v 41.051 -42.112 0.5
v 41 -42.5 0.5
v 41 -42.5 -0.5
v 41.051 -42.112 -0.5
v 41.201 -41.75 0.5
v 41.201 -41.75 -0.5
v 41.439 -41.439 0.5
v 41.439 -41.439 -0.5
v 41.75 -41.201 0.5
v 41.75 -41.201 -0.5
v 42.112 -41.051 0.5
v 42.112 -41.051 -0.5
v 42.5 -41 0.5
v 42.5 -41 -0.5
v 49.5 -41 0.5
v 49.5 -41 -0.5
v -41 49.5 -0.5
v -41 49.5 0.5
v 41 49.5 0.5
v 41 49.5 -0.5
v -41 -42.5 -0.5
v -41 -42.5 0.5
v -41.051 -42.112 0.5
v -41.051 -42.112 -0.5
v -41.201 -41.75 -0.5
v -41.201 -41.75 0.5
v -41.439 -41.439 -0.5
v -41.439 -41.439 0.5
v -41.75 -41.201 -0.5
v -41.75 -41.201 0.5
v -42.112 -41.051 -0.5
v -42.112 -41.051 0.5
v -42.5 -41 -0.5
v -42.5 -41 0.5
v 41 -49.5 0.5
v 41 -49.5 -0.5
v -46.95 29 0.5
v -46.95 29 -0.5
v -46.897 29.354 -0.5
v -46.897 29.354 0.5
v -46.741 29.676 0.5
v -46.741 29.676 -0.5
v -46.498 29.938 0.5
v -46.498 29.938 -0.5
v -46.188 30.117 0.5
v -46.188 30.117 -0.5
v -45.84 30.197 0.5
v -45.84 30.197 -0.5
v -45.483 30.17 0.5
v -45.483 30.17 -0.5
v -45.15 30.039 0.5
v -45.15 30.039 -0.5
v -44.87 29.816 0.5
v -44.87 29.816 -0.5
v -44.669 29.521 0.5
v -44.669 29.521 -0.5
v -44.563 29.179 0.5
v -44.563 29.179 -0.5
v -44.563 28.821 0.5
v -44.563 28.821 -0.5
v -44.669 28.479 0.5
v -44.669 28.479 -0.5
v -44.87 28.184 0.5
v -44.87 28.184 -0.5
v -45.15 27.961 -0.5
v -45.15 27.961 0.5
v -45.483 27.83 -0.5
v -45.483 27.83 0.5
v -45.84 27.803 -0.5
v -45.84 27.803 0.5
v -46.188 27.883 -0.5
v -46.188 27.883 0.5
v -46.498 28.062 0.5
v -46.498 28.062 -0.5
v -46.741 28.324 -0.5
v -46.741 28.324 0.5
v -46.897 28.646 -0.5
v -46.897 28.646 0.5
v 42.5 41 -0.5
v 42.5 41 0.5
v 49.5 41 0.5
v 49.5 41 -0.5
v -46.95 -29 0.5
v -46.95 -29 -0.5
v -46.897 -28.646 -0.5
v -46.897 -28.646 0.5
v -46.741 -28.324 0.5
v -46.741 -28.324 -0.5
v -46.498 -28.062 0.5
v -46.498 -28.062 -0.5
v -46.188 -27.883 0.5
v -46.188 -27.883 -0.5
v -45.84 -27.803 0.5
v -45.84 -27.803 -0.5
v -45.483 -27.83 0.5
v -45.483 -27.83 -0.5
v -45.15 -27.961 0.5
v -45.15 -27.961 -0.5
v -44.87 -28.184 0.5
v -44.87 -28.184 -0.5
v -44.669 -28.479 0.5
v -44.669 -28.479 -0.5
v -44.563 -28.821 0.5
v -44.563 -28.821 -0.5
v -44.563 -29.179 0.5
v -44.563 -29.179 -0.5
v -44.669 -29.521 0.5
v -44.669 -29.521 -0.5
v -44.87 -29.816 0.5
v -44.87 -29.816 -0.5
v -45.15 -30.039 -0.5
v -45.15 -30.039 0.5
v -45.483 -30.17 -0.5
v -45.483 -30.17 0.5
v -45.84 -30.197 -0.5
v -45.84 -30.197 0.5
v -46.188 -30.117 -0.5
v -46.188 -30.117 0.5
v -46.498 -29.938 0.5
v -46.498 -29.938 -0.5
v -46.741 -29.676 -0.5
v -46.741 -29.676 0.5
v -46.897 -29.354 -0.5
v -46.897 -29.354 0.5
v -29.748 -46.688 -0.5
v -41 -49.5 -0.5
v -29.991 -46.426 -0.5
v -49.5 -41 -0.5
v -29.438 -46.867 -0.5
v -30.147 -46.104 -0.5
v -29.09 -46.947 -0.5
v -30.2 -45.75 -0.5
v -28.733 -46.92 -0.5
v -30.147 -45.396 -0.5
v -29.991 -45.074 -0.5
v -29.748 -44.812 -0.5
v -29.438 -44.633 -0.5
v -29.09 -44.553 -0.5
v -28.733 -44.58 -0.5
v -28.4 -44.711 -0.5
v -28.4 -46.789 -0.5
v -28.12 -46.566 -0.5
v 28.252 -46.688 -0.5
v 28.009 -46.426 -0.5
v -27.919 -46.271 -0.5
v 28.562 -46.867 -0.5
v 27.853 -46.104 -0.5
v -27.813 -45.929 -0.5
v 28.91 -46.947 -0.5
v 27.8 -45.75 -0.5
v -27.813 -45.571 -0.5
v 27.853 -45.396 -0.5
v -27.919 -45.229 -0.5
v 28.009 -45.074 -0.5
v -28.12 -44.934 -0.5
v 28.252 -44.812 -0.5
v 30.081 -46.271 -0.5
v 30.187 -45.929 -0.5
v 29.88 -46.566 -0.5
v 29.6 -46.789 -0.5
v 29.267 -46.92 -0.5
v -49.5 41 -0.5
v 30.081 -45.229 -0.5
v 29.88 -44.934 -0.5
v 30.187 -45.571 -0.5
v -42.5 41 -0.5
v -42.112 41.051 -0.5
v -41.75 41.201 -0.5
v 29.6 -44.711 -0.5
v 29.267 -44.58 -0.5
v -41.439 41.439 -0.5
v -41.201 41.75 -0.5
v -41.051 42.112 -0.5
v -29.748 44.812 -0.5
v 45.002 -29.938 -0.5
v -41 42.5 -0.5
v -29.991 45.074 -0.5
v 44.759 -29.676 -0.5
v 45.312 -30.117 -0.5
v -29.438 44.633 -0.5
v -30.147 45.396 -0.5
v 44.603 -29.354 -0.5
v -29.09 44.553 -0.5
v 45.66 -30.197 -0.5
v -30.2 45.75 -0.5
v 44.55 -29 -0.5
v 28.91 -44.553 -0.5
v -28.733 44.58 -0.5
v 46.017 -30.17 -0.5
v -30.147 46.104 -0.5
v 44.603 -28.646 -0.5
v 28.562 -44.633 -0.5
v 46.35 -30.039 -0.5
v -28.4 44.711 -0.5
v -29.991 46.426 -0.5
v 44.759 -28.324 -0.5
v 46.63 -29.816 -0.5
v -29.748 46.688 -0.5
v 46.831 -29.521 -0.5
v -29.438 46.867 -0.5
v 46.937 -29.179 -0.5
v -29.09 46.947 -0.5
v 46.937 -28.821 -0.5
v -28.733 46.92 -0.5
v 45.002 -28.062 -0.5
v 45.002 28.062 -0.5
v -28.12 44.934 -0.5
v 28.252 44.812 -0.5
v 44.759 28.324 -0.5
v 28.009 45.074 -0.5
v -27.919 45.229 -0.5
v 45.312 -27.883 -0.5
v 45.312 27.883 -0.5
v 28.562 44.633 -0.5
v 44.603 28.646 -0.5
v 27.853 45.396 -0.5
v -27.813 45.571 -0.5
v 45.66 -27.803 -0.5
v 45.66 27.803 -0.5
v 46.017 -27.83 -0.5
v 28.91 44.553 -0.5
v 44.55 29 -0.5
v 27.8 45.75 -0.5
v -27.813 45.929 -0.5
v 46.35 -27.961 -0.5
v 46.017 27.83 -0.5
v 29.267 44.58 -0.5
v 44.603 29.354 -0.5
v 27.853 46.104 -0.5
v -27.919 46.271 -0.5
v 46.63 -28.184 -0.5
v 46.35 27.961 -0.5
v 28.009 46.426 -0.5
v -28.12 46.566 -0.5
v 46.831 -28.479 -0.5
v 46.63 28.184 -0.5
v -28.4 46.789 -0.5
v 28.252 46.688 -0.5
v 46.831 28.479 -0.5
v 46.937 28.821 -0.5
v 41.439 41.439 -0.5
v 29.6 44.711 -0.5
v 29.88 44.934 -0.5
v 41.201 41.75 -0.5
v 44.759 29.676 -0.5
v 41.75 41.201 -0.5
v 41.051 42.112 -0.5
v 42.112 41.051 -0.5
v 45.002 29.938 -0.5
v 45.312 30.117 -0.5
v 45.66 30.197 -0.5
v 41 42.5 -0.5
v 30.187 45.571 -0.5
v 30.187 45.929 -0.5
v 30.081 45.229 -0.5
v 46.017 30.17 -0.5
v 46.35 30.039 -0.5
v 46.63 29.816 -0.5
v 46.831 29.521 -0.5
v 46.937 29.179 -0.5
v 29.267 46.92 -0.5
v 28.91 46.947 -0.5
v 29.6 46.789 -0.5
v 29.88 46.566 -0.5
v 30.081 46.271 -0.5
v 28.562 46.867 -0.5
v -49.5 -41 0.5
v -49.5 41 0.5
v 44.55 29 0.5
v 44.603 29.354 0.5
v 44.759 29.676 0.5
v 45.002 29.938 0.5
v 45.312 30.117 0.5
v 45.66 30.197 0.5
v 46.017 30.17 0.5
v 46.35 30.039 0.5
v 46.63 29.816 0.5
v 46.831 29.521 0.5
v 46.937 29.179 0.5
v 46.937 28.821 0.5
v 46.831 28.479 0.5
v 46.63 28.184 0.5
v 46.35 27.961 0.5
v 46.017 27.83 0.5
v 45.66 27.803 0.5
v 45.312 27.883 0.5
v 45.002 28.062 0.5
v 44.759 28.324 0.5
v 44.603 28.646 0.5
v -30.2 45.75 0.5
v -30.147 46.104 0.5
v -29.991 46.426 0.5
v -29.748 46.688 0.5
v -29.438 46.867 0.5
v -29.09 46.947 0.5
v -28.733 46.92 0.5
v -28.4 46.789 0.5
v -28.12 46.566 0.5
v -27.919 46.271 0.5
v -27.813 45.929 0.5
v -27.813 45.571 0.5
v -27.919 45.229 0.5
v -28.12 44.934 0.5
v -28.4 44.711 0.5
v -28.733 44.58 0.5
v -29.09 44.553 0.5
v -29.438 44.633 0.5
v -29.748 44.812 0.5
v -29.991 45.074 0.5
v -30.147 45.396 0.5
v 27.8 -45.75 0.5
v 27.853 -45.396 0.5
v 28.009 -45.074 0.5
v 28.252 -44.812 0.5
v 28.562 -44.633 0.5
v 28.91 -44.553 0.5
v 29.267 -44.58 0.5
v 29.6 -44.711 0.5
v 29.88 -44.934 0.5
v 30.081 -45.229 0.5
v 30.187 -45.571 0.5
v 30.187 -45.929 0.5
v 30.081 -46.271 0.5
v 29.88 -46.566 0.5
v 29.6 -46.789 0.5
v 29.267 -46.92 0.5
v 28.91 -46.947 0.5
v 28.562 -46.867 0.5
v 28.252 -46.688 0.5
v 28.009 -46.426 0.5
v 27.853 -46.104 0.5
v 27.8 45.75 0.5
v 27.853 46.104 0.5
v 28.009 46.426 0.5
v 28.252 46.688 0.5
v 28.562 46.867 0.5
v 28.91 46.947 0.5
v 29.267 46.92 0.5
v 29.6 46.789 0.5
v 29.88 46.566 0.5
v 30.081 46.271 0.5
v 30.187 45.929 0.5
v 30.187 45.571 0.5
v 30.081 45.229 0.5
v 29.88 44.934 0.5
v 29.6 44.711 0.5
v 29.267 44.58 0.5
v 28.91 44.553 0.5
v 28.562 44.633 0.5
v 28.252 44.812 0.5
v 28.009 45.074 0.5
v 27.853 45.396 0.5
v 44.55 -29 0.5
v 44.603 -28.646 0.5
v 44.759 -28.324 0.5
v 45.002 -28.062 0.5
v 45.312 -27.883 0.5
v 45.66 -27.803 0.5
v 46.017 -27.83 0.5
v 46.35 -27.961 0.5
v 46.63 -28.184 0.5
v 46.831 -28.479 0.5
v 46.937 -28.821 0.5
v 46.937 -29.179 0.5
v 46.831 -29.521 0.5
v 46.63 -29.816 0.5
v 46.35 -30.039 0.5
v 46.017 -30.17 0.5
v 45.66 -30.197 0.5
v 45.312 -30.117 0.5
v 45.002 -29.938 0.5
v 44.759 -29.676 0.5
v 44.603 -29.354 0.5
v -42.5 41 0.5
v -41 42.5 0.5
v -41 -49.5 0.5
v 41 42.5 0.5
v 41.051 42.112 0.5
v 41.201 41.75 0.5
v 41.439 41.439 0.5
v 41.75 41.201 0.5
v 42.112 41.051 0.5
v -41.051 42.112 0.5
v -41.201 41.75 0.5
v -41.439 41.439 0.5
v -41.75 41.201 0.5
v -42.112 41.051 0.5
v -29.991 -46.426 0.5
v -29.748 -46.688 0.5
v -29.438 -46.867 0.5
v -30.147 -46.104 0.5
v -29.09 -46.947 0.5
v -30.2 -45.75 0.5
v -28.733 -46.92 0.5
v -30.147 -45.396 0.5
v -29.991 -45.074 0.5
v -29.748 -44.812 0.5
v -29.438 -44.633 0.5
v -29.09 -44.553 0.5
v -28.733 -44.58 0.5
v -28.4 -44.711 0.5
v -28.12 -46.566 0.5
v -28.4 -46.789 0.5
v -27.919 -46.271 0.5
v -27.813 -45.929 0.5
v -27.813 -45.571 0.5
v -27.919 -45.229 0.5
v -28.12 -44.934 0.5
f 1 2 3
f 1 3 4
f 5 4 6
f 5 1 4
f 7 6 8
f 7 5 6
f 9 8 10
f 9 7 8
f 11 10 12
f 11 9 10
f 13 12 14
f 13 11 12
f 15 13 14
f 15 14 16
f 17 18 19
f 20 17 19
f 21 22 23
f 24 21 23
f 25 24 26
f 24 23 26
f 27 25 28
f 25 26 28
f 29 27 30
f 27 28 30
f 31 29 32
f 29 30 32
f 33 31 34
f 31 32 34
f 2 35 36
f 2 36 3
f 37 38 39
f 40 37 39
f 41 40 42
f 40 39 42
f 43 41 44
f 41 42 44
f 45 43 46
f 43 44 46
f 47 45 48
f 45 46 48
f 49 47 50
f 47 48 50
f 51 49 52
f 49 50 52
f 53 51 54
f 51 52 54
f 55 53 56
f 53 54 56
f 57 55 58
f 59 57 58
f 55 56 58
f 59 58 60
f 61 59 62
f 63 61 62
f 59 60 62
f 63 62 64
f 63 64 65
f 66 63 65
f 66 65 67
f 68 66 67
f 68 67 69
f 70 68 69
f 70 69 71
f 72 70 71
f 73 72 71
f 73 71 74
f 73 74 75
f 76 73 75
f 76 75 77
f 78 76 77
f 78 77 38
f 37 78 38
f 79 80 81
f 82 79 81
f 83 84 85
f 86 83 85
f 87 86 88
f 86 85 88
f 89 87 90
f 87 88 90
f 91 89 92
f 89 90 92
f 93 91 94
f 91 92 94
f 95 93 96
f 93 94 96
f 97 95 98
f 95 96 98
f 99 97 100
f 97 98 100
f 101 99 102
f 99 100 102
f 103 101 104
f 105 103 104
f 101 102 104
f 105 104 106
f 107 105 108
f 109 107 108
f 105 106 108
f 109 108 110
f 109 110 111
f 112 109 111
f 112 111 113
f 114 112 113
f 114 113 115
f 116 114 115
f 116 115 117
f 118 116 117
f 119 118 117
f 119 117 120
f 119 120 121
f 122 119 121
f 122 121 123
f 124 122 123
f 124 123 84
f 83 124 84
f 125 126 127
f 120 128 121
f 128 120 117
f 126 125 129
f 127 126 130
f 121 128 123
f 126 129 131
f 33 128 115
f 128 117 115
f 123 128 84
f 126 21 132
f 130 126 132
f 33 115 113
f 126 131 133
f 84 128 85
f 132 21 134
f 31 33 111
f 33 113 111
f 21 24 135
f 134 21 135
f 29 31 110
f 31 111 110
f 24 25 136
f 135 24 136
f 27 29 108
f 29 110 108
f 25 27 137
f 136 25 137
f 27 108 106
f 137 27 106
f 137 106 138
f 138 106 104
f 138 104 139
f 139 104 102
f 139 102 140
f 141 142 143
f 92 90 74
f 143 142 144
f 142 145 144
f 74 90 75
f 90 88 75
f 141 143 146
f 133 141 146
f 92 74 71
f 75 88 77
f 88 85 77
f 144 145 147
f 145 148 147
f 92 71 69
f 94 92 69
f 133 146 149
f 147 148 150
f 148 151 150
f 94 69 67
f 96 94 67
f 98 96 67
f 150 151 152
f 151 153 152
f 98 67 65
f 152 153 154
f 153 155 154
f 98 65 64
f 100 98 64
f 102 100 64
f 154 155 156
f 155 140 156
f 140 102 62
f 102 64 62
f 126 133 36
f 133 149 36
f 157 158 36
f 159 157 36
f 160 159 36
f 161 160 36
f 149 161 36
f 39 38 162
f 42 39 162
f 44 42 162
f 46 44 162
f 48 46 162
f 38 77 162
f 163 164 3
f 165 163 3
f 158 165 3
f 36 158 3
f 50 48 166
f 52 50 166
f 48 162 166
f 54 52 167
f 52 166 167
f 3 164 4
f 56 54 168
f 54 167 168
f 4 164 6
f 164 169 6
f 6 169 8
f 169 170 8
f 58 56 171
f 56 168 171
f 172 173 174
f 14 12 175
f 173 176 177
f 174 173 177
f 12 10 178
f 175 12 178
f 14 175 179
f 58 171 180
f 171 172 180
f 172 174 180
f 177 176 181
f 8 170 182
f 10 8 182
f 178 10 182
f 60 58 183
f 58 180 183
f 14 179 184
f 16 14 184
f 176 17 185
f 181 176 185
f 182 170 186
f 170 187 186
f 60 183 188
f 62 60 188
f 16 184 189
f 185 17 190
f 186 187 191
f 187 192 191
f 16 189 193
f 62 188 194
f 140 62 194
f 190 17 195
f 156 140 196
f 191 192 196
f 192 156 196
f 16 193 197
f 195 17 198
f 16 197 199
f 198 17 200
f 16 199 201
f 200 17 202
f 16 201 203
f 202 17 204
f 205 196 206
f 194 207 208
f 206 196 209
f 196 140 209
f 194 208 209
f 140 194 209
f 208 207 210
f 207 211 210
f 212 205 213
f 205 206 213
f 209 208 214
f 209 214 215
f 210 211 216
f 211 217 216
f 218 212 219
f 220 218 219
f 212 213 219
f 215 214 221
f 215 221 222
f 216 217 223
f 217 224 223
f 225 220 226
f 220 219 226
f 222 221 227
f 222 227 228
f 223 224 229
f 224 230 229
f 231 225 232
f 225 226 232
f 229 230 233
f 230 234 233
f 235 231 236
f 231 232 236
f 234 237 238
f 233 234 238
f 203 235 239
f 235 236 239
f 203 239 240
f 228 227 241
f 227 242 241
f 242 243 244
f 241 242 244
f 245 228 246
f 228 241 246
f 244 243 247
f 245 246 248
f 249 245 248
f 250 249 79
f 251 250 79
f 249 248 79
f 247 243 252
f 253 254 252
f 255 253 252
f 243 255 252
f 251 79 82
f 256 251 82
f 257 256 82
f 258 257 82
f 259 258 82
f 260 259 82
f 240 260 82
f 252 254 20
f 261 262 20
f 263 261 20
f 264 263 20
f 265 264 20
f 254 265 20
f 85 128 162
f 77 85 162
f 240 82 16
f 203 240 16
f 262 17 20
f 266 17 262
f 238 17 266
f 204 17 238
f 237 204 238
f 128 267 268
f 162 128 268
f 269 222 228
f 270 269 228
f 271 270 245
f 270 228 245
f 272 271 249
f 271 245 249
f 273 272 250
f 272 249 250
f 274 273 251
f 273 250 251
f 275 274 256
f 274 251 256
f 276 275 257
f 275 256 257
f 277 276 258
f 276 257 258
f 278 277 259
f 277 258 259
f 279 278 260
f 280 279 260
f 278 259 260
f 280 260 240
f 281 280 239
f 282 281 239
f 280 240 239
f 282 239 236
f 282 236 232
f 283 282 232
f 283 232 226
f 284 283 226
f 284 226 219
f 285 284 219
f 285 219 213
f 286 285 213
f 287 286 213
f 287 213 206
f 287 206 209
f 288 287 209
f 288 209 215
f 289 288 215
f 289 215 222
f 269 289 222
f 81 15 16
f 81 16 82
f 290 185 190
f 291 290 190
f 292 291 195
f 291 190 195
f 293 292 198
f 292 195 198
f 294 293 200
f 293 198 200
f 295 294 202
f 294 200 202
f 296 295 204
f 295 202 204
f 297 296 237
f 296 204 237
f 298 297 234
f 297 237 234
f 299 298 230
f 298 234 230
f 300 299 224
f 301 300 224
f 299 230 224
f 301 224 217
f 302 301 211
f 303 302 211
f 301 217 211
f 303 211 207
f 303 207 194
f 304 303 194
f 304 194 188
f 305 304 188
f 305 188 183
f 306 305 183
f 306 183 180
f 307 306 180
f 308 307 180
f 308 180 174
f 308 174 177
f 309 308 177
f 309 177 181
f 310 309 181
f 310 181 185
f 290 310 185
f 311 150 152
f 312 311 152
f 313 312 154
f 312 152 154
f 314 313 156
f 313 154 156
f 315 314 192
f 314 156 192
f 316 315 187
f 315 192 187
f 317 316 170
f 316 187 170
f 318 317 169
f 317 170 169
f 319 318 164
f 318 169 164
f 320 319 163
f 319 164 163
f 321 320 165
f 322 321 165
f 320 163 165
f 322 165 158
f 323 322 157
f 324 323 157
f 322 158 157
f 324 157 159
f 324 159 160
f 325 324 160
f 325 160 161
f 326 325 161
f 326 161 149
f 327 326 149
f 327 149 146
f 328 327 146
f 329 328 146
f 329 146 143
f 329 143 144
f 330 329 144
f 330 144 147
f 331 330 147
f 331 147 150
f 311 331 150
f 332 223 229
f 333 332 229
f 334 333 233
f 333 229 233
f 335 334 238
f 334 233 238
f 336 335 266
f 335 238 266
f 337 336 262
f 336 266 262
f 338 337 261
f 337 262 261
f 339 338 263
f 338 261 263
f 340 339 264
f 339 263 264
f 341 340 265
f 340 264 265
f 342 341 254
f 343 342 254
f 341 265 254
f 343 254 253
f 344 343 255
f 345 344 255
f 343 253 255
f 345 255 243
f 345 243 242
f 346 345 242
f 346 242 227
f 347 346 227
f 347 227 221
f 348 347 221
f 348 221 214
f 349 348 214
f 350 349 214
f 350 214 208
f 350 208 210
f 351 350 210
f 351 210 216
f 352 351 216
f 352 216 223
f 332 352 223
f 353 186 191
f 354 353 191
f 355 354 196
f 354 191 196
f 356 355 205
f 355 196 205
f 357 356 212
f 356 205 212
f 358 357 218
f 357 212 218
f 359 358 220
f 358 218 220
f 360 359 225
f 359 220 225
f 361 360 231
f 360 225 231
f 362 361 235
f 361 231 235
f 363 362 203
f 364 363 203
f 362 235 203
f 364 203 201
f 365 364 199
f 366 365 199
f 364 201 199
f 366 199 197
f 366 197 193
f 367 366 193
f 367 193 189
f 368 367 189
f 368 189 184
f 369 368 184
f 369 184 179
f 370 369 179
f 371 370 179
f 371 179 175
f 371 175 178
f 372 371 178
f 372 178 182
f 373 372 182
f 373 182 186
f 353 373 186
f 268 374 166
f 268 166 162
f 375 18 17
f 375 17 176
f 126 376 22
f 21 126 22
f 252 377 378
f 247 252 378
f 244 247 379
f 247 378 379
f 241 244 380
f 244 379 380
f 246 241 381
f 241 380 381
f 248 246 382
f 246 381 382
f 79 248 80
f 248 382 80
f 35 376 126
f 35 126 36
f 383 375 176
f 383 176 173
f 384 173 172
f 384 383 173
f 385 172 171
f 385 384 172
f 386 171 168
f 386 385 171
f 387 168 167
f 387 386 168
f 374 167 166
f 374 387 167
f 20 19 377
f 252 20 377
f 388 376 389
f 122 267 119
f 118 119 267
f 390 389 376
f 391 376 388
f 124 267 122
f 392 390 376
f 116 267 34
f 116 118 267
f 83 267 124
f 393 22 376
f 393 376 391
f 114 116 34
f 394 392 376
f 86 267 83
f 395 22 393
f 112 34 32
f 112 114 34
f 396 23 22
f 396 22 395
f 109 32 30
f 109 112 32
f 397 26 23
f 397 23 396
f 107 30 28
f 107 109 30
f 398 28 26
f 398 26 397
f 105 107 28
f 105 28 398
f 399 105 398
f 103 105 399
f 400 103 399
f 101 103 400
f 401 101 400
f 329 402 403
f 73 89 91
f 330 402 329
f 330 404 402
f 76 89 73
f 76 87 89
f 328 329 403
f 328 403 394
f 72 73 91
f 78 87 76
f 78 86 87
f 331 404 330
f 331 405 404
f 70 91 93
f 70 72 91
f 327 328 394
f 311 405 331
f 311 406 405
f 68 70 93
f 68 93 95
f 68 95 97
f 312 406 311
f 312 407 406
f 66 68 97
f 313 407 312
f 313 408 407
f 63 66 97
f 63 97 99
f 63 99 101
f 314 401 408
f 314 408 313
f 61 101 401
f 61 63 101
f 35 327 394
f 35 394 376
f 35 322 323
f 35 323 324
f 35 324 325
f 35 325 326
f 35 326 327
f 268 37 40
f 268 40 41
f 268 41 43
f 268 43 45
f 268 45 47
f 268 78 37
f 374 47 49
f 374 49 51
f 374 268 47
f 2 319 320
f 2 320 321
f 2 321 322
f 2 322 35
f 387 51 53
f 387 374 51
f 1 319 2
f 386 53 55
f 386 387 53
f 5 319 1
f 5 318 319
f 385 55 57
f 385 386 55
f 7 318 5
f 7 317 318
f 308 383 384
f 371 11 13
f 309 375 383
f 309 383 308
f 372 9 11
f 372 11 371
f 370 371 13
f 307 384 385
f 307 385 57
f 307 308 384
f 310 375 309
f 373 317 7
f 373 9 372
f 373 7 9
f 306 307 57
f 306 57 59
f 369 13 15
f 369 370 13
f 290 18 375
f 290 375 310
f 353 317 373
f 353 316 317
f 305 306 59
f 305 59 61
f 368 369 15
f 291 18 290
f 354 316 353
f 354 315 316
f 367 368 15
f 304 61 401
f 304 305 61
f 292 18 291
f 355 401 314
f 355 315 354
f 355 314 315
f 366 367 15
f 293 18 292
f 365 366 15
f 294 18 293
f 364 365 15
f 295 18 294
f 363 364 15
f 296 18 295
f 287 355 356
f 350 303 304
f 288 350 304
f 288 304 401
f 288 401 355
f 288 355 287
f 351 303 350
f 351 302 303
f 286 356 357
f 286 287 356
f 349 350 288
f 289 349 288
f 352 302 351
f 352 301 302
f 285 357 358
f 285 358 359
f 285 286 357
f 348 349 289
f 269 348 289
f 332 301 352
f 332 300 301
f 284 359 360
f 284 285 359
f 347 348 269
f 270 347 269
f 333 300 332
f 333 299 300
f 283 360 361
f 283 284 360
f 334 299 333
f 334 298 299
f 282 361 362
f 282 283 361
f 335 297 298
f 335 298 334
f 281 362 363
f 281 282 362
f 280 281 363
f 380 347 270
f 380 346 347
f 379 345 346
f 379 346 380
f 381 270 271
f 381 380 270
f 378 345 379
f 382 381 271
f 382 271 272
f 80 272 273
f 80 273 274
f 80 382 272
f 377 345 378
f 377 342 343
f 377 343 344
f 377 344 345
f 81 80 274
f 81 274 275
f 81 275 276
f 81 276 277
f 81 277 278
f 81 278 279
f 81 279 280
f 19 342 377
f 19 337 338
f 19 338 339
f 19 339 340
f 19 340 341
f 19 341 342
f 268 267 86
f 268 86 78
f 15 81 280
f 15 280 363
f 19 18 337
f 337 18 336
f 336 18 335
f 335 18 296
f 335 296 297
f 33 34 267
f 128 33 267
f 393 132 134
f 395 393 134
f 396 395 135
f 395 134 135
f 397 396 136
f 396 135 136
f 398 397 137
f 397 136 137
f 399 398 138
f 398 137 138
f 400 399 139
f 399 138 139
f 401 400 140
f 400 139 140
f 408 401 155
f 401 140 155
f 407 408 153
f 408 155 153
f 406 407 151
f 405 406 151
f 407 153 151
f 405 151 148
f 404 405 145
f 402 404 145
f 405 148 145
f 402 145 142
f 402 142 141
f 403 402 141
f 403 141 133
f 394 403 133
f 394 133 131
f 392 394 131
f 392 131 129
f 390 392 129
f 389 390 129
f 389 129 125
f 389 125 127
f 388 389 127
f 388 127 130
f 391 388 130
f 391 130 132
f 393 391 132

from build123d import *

# Parameters (mm, degrees)
SKETCH1_W           = 99
SKETCH1_H           = 99
BOSS_EXTRUDE1_DEPTH = 0.5
CUT_EXTRUDE1_DEPTH  = 71.010713466
M2_HOLE1_B_D        = 2.4
M2_HOLE1_B_DEPTH    = 3
M2_HOLE1_B_TIP      = 0.721032743


with BuildPart() as part:
    # Sketch1 → Boss-Extrude1 (new, symmetric)
    with BuildSketch(Plane.XY):
        Rectangle(SKETCH1_W, SKETCH1_H)
    extrude(amount=BOSS_EXTRUDE1_DEPTH, both=True)

    # Sketch2 → Cut-Extrude1 (cut, through all)
    with BuildSketch(Plane.XY.offset(0.5)):
        with BuildLine():
            Line((-49.5, 49.5), (-41, 49.5))
            Line((-41, 49.5), (-41, 42.5))
            ThreePointArc((-41, 42.5), (-41.439339828, 41.439339828), (-42.5, 41))
            Line((-42.5, 41), (-49.5, 41))
            Line((-49.5, 41), (-49.5, 49.5))
        make_face()
        with BuildLine():
            Line((49.5, 49.5), (41, 49.5))
            Line((41, 49.5), (41, 42.5))
            ThreePointArc((41, 42.5), (41.439339828, 41.439339828), (42.5, 41))
            Line((42.5, 41), (49.5, 41))
            Line((49.5, 41), (49.5, 49.5))
        make_face()
        with BuildLine():
            Line((-49.5, -49.5), (-41, -49.5))
            Line((-41, -49.5), (-41, -42.5))
            ThreePointArc((-41, -42.5), (-41.439339828, -41.439339828), (-42.5, -41))
            Line((-42.5, -41), (-49.5, -41))
            Line((-49.5, -41), (-49.5, -49.5))
        make_face()
        with BuildLine():
            Line((49.5, -49.5), (41, -49.5))
            Line((41, -49.5), (41, -42.5))
            ThreePointArc((41, -42.5), (41.439339828, -41.439339828), (42.5, -41))
            Line((42.5, -41), (49.5, -41))
            Line((49.5, -41), (49.5, -49.5))
        make_face()
    extrude(amount=-CUT_EXTRUDE1_DEPTH, mode=Mode.SUBTRACT)

    # M2 Hole1 - B
    with Locations(Plane.XY.offset(0.5)):
        with Locations((-45.75, 29), (-29, 45.75), (29, 45.75), (45.75, 29), (45.75, -29), (29, -45.75), (-29, -45.75), (-45.75, -29)):
            Hole(M2_HOLE1_B_D / 2, depth=M2_HOLE1_B_DEPTH)
            with Locations((0, 0, -(M2_HOLE1_B_DEPTH + M2_HOLE1_B_TIP / 2))):  # 118° drill point
                Cone(0, M2_HOLE1_B_D / 2, M2_HOLE1_B_TIP, mode=Mode.SUBTRACT)


solid = part.part
